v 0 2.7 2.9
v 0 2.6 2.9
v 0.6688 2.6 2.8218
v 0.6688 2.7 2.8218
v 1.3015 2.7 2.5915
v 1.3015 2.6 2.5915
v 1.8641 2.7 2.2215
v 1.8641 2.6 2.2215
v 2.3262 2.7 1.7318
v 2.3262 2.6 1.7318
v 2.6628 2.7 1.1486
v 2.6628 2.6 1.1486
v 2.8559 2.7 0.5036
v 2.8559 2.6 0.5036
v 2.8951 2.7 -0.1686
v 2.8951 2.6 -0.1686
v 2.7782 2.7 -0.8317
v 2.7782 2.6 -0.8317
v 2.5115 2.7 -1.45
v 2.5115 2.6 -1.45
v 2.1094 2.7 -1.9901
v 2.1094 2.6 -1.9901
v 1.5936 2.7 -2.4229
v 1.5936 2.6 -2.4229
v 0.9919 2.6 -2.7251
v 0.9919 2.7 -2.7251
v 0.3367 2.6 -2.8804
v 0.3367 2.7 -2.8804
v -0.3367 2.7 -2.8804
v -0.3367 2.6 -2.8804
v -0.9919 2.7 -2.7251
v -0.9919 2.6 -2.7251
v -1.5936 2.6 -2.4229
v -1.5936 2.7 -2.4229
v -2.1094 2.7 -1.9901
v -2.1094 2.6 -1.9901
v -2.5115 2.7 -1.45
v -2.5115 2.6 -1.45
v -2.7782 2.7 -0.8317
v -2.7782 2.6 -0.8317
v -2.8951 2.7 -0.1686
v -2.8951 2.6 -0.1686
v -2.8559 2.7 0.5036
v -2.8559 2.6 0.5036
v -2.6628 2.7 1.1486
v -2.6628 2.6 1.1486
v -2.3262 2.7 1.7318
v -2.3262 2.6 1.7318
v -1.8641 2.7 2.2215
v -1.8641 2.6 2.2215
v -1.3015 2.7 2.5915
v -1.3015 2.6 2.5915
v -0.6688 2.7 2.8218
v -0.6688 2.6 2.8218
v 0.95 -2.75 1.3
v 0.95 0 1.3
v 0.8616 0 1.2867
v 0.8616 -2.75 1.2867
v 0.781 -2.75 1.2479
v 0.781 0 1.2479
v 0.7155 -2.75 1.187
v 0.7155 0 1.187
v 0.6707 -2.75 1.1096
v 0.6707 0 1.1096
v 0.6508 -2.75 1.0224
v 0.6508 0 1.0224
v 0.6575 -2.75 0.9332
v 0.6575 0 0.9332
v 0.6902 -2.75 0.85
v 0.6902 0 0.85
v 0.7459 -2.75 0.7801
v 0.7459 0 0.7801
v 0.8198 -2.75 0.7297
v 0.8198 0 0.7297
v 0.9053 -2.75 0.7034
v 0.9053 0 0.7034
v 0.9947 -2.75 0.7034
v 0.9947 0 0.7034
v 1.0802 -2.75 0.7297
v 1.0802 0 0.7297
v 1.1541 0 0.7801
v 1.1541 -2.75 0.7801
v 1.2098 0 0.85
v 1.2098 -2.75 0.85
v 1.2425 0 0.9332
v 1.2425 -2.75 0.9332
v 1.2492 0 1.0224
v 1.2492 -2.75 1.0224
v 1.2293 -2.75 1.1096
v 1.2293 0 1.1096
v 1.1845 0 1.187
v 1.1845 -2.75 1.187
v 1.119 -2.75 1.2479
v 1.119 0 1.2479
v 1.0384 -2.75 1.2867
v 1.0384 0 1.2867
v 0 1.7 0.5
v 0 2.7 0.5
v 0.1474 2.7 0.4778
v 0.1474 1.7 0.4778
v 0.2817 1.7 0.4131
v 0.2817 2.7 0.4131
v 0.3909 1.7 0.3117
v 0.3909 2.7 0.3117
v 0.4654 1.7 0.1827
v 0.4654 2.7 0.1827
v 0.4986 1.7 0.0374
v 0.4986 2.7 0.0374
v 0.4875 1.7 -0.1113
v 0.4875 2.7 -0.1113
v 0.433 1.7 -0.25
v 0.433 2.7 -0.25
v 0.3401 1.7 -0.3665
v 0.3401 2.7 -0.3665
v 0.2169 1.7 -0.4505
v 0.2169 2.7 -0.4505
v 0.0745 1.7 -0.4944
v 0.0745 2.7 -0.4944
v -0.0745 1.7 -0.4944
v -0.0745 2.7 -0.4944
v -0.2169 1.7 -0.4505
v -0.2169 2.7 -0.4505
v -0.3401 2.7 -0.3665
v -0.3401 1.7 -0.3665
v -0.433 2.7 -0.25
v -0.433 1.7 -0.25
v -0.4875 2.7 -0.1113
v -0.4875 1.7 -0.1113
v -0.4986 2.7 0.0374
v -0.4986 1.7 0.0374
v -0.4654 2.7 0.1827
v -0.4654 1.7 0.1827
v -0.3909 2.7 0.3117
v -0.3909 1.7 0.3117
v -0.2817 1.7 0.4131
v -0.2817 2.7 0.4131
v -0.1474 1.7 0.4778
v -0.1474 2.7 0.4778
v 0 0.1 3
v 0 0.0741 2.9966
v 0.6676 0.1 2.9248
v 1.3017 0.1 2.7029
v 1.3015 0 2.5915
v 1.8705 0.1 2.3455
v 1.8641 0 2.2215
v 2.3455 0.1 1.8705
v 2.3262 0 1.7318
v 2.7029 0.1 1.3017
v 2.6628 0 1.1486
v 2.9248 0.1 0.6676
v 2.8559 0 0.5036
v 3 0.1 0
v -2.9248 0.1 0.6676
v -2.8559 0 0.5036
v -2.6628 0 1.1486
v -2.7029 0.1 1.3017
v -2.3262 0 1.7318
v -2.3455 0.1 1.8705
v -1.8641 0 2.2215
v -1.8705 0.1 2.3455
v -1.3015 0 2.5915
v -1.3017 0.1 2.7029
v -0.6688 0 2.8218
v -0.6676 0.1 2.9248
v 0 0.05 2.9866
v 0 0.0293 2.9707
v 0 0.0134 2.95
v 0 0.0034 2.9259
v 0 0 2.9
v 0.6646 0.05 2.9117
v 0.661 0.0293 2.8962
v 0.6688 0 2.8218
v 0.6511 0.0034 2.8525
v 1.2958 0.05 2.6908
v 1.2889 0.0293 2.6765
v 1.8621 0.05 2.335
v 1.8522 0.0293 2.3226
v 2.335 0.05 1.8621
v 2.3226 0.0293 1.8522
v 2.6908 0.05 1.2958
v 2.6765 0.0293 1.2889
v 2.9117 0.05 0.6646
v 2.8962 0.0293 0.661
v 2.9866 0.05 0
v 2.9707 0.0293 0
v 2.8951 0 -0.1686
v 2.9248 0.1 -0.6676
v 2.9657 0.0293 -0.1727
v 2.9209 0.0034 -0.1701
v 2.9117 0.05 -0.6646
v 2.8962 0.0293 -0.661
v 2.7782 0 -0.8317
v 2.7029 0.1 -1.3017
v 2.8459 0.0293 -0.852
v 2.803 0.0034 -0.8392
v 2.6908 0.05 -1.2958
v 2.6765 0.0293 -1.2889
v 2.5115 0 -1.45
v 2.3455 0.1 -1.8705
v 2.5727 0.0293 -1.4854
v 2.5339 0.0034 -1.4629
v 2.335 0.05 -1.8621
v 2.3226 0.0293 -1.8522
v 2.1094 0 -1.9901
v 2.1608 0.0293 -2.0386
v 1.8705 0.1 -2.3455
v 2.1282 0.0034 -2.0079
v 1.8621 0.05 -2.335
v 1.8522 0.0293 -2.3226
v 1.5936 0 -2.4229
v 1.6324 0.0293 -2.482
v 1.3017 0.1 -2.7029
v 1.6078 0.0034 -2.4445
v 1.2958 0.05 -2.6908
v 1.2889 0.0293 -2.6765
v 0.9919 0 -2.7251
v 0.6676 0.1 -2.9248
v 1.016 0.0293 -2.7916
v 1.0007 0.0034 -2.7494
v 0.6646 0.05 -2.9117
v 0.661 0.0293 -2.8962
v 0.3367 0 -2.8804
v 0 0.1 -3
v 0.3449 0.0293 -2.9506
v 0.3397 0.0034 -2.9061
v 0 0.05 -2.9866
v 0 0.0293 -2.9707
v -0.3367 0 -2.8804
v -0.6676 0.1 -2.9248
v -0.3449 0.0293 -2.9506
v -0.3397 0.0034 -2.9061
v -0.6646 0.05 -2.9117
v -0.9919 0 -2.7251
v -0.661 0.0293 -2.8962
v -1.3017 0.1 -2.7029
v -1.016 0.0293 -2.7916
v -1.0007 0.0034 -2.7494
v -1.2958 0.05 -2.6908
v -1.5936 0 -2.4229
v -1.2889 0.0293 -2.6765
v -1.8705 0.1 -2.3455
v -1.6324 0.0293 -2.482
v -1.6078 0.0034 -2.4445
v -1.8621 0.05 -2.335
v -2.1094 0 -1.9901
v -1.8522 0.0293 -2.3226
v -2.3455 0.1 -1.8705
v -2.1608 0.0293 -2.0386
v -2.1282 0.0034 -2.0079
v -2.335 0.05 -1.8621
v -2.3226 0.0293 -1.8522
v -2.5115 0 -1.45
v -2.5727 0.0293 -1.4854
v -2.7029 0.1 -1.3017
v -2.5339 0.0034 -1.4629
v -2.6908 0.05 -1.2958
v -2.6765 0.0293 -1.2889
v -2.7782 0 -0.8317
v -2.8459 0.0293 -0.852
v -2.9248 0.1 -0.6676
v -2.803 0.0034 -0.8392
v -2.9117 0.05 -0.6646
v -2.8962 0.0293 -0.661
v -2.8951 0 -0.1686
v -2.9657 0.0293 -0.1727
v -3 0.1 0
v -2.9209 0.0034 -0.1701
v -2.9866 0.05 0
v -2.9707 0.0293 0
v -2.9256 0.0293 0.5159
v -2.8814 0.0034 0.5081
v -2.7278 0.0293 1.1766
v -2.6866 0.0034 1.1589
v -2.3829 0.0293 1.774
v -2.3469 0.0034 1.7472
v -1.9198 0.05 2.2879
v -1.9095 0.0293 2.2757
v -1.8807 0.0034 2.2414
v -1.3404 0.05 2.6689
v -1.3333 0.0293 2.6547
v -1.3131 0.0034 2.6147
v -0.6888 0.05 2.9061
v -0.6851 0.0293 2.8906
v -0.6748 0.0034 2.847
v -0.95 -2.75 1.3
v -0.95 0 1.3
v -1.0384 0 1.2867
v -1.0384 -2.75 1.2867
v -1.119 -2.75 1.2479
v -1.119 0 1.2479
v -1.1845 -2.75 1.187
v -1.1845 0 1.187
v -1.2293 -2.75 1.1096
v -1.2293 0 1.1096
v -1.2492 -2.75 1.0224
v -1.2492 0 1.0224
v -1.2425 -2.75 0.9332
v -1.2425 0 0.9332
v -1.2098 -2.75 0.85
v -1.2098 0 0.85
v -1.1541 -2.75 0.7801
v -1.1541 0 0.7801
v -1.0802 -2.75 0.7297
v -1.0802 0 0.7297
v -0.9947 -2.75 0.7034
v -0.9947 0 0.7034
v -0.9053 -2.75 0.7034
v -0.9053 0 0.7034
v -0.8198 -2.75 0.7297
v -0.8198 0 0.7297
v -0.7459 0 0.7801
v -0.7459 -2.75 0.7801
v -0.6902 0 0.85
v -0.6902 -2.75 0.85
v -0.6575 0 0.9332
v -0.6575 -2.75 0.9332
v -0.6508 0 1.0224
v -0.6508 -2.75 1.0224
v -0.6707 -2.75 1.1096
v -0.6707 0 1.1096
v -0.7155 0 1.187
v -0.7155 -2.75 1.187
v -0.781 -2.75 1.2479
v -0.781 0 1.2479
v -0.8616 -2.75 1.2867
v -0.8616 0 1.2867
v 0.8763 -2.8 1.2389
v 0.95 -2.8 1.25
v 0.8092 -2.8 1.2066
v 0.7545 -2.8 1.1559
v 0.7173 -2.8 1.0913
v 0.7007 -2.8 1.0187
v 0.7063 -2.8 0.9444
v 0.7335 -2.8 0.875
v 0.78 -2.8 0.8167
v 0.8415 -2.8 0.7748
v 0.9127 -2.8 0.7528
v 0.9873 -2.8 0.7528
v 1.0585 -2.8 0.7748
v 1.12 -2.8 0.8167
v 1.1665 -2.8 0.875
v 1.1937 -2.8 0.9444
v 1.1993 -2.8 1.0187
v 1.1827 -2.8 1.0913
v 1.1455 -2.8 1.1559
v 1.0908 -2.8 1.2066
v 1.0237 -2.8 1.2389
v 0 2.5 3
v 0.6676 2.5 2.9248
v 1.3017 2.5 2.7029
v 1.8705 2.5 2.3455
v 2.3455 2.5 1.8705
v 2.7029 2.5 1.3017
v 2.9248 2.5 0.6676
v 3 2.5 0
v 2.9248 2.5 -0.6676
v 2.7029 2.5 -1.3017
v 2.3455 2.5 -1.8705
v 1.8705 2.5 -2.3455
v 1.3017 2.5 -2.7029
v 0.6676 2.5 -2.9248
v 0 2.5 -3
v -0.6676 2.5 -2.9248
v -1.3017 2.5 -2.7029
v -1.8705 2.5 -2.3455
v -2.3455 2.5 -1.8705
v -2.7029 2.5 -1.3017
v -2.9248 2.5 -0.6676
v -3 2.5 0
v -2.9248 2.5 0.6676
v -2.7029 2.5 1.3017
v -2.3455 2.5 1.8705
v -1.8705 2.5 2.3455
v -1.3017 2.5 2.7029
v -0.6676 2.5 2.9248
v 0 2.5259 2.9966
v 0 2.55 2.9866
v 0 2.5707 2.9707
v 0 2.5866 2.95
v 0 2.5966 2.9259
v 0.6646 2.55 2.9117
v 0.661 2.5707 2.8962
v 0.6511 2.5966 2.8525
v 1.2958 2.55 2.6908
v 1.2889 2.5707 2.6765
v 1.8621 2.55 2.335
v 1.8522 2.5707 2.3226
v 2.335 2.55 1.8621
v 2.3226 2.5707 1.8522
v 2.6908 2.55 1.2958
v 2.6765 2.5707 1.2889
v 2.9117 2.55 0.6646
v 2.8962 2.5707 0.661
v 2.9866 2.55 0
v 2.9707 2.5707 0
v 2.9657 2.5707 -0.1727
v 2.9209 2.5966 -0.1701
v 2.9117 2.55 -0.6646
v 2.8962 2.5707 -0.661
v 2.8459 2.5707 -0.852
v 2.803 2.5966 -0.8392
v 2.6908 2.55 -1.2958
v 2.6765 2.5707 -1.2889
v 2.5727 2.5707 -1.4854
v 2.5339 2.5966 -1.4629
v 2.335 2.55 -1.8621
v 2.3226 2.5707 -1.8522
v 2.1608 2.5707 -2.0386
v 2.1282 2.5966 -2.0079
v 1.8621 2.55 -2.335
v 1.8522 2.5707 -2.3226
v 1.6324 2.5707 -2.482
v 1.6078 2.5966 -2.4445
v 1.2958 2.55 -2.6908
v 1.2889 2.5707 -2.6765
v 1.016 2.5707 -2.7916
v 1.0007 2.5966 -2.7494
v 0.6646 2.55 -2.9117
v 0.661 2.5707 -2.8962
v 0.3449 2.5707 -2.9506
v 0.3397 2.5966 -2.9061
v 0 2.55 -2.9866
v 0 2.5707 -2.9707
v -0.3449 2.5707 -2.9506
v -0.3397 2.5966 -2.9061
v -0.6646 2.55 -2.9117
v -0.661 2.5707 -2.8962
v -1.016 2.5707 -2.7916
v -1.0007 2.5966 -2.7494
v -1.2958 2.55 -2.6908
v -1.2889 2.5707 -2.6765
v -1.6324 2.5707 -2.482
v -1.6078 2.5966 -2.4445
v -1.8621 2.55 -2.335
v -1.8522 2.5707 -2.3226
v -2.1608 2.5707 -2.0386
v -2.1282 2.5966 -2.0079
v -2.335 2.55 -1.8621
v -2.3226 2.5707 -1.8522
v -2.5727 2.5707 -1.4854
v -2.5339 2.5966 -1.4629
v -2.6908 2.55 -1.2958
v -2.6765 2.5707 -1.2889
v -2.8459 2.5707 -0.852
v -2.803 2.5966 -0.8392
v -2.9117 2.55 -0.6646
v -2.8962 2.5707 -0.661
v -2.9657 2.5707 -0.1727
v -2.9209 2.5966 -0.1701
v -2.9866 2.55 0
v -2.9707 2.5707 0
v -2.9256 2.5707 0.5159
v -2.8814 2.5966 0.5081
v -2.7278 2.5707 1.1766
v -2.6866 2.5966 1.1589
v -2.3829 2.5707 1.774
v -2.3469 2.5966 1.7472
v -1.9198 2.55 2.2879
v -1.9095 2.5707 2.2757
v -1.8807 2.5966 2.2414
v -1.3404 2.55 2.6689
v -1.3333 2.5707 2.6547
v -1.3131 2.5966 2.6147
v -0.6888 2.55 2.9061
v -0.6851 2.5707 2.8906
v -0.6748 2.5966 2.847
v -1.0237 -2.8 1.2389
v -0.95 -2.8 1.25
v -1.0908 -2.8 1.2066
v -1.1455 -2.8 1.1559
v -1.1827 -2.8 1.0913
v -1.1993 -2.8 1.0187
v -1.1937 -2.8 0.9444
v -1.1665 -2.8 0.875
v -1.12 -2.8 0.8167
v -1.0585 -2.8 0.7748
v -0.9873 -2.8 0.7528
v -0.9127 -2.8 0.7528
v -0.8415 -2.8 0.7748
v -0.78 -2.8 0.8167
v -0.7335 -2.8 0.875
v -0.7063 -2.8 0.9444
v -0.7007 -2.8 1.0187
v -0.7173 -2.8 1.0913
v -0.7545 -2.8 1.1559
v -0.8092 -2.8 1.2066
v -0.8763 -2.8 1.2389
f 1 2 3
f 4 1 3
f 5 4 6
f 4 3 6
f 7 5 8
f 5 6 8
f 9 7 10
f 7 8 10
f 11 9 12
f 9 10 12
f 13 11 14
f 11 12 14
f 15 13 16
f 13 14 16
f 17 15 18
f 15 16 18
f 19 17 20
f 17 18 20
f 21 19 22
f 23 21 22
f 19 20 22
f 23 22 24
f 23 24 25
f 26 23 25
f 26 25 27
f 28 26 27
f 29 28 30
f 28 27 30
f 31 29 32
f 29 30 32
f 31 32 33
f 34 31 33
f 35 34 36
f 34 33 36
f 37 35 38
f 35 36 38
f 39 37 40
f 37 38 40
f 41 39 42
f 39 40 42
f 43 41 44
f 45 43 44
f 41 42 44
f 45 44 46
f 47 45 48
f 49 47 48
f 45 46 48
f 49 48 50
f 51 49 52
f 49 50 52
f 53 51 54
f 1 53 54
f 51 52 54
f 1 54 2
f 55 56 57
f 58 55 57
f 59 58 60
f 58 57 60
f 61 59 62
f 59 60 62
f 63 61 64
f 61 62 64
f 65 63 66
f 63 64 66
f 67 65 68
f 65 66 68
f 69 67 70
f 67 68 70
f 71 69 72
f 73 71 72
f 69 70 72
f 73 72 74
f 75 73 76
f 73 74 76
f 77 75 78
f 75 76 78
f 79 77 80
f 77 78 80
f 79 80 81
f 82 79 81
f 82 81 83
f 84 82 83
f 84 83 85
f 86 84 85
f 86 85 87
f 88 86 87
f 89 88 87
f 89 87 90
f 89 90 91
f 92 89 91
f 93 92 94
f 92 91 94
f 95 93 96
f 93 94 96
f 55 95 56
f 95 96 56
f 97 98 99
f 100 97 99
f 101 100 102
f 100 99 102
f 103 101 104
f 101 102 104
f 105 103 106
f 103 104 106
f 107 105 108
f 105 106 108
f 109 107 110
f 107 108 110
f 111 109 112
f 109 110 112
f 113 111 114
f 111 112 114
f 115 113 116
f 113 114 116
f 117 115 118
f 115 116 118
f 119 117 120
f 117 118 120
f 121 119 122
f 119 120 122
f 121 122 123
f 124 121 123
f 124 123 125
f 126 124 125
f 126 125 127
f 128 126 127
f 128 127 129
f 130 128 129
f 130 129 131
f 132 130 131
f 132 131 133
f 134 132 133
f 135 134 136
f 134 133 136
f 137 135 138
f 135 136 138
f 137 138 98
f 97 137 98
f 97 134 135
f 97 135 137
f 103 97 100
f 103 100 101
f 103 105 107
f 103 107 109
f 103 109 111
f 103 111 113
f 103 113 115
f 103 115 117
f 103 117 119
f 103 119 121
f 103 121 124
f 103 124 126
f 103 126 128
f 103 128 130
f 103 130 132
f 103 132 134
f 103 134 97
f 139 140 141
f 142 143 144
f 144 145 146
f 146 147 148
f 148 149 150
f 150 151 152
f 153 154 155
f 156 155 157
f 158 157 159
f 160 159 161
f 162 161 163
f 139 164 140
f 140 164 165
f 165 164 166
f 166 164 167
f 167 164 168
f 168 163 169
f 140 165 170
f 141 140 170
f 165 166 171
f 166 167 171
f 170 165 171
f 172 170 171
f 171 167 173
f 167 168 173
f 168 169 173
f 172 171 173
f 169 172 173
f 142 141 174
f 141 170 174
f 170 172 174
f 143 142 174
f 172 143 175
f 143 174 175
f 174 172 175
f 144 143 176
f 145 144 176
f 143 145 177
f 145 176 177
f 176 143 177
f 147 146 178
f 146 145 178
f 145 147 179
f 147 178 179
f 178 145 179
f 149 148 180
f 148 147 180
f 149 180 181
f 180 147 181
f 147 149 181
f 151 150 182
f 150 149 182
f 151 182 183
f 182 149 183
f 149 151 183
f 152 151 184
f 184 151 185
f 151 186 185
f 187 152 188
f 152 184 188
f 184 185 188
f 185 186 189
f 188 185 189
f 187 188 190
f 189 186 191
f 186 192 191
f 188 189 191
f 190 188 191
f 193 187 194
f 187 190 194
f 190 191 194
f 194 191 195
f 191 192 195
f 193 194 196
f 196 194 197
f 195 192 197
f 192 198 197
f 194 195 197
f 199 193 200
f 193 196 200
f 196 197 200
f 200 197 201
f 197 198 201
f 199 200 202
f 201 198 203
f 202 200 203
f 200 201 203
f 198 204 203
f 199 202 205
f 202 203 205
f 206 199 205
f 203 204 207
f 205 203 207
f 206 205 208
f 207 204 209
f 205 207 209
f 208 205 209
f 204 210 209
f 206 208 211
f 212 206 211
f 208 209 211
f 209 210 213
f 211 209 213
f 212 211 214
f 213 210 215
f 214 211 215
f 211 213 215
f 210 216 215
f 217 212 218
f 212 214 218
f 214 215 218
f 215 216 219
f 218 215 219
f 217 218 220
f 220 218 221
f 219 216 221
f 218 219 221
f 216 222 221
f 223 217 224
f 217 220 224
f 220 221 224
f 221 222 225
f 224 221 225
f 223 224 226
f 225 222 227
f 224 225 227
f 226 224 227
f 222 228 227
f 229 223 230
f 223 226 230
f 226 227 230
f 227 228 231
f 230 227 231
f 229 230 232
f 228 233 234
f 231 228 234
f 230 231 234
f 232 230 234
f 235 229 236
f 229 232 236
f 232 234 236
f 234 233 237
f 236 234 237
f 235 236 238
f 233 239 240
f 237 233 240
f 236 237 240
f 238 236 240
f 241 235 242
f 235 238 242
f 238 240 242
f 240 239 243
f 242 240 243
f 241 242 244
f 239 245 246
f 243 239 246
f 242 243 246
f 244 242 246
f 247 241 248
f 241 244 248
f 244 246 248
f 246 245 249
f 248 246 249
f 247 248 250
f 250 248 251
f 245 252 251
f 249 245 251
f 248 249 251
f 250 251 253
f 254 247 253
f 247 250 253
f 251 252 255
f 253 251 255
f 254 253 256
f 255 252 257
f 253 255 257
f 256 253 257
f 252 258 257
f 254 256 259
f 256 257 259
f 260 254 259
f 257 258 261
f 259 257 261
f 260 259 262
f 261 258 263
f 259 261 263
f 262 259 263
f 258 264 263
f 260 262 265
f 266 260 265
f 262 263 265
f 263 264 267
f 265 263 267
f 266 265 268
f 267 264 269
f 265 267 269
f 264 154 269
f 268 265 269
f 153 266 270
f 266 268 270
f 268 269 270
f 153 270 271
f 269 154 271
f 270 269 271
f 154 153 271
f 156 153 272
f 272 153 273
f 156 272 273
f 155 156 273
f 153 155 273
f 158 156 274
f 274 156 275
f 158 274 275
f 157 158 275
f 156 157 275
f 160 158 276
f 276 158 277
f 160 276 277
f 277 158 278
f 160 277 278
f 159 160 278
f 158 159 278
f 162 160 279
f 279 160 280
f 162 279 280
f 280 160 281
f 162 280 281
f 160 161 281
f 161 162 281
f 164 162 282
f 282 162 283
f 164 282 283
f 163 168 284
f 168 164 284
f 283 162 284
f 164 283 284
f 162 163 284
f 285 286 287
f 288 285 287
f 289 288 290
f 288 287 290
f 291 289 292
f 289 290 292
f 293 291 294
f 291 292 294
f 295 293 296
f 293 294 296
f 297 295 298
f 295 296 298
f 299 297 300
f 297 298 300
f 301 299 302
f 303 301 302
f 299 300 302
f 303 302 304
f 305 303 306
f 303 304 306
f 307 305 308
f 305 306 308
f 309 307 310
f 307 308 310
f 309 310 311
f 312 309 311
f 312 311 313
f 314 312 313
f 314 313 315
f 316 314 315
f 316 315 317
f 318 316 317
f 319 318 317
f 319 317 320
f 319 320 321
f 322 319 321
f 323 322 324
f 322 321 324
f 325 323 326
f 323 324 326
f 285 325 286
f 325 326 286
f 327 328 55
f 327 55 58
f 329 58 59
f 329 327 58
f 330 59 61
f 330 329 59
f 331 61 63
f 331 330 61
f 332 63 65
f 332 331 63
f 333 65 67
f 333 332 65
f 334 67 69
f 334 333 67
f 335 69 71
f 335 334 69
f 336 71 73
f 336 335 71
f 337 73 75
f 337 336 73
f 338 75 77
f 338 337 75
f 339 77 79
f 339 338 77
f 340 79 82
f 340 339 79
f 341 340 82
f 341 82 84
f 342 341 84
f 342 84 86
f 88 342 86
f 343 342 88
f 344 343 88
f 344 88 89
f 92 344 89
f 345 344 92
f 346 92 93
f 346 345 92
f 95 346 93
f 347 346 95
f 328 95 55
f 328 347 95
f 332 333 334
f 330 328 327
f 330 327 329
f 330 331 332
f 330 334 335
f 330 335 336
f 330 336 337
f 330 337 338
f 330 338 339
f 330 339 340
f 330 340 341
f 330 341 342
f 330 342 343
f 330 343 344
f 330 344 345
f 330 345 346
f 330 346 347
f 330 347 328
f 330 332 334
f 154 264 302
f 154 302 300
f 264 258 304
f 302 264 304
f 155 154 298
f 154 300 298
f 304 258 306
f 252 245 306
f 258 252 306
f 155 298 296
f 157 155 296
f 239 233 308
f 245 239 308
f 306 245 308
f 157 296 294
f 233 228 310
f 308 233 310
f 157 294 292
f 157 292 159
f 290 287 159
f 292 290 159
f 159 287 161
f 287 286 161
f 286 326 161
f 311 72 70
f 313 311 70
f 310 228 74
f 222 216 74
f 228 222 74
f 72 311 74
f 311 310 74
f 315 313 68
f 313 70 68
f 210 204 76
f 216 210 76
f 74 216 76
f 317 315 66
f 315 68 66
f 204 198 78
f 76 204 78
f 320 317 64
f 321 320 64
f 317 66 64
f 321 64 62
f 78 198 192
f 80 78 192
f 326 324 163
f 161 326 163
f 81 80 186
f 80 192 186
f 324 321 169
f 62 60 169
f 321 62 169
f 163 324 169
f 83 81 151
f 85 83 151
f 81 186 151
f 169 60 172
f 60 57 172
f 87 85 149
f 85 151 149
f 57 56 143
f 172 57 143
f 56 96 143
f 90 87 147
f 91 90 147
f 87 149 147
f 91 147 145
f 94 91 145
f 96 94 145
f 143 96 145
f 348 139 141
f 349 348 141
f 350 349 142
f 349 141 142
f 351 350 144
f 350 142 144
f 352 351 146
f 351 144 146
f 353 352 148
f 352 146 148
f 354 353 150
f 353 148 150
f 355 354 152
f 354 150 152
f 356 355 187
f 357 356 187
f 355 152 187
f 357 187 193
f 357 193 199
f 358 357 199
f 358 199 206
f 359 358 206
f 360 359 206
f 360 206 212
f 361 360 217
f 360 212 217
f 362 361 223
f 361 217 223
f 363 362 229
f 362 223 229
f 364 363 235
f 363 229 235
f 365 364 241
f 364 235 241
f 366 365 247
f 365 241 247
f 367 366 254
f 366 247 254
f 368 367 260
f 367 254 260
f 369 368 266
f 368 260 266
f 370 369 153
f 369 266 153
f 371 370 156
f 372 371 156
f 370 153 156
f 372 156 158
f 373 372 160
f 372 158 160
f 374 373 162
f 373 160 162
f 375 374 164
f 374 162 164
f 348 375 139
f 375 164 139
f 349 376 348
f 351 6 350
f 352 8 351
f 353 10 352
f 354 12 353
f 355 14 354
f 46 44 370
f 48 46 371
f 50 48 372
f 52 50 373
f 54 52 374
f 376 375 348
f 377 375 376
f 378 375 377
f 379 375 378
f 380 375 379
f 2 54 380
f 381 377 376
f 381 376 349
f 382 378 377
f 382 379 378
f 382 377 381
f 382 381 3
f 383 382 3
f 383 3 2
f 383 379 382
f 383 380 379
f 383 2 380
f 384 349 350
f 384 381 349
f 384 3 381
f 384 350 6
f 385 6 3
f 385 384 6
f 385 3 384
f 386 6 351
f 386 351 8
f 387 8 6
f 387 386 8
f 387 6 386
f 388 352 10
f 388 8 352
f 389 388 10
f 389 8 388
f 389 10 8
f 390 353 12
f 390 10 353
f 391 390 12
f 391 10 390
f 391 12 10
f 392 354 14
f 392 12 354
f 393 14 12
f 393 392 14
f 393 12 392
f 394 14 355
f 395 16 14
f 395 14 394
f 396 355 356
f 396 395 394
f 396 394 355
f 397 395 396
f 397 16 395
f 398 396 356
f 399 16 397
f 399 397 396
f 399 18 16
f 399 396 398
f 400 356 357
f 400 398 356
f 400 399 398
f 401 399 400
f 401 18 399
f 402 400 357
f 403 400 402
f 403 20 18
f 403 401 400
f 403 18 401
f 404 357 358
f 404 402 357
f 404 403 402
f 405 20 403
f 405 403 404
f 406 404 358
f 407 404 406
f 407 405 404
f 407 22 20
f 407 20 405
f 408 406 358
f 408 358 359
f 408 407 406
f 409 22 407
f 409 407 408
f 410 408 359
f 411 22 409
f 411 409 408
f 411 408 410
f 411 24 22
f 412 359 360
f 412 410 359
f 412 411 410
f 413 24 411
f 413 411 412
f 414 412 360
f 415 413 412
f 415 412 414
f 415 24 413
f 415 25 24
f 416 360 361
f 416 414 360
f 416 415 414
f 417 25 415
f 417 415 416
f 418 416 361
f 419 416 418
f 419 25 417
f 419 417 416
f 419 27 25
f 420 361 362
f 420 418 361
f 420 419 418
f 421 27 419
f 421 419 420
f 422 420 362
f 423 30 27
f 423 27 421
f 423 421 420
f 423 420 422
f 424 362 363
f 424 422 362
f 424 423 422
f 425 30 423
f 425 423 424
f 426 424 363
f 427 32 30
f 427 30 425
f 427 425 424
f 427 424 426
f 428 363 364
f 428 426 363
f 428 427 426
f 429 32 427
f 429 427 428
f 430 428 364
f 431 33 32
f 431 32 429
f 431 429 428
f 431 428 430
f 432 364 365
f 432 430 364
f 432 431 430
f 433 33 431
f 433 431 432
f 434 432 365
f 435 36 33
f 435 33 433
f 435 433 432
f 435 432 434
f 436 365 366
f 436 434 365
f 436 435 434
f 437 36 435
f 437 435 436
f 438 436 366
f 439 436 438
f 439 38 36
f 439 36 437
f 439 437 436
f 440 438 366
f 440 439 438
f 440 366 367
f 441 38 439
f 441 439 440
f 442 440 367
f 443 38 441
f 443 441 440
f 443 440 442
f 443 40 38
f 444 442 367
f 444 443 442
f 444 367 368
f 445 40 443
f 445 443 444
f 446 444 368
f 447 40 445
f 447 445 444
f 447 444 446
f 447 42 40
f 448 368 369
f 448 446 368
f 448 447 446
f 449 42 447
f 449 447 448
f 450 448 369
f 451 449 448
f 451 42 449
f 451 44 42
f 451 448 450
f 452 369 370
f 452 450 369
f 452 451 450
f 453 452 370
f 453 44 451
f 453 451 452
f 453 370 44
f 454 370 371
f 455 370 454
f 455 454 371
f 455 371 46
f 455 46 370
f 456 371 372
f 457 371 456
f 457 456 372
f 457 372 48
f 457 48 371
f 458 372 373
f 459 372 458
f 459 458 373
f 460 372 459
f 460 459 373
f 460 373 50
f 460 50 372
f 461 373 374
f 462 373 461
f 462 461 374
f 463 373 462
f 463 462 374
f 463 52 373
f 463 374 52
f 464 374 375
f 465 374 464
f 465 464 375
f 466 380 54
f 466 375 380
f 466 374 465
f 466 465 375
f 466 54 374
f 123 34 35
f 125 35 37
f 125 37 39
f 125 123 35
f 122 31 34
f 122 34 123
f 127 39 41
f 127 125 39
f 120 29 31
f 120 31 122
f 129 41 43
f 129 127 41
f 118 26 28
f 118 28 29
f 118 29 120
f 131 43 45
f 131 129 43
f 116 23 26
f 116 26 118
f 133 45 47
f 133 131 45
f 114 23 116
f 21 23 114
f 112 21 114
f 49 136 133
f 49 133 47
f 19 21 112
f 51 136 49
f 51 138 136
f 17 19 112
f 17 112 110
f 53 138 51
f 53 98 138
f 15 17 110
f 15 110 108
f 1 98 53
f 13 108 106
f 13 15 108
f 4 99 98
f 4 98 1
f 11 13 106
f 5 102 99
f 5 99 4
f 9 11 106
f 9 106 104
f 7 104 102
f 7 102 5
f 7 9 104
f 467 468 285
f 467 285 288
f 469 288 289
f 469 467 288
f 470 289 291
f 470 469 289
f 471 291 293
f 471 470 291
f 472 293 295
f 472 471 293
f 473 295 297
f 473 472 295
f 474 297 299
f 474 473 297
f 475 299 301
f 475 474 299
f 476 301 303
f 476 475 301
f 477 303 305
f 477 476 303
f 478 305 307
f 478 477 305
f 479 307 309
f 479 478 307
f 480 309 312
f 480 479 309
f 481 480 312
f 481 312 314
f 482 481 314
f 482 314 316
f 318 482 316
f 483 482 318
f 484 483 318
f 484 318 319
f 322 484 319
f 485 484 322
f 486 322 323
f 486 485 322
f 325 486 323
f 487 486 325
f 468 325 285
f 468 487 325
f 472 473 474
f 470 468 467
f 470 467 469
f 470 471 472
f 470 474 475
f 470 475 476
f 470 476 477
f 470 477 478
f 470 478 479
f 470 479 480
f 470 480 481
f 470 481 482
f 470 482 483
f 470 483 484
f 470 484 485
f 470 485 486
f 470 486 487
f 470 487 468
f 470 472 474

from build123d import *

# Parameters (mm, degrees)
SKETCH1_R           = 3
BOSS_EXTRUDE1_DEPTH = 2.6
FILLET1_R           = 0.1
SKETCH3_R           = 2.9
BOSS_EXTRUDE2_DEPTH = 0.1
SKETCH2_R           = 0.5
CUT_EXTRUDE1_DEPTH  = 1
SKETCH4_R           = 0.3
BOSS_EXTRUDE3_DEPTH = 2.8
CHAMFER1_SIZE       = 0.05


with BuildPart() as part:
    # Sketch1 → Boss-Extrude1 (new body)
    with BuildSketch(Plane(origin=(0, 0, 0), x_dir=(1, 0, 0), z_dir=(0, 1, 0))):
        with Locations(Location((0, 0, 0), (0, 0, 270))):
            Circle(SKETCH1_R)
    extrude(amount=BOSS_EXTRUDE1_DEPTH)

    # Fillet1
    fillet1_edges = [part.edges().sort_by_distance(p)[0] for p in [
        (0, 0, -3),
        (0, 2.6, -3),
    ]]
    fillet(fillet1_edges, radius=FILLET1_R)

    # Sketch3 → Boss-Extrude2 (add)
    with BuildSketch(Plane(origin=(0, 2.6, 0), x_dir=(1, 0, 0), z_dir=(0, 1, 0))):
        with Locations(Location((0, 0, 0), (0, 0, 270))):
            Circle(SKETCH3_R)
    extrude(amount=BOSS_EXTRUDE2_DEPTH)

    # Sketch2 → Cut-Extrude1 (cut)
    with BuildSketch(Plane(origin=(0, 2.7, 0), x_dir=(1, 0, 0), z_dir=(0, 1, 0))):
        with Locations(Location((0, 0, 0), (0, 0, 270))):
            Circle(SKETCH2_R)
    extrude(amount=-CUT_EXTRUDE1_DEPTH, mode=Mode.SUBTRACT)

    # Sketch4 → Boss-Extrude3 (add)
    with BuildSketch(Plane.XZ):
        with Locations(Location((-0.95, 1, 0), (0, 0, 90))):
            Circle(SKETCH4_R)
        with Locations(Location((0.95, 1, 0), (0, 0, 90))):
            Circle(SKETCH4_R)
    extrude(amount=BOSS_EXTRUDE3_DEPTH)

    # Chamfer1
    chamfer1_edges = [part.edges().sort_by_distance(p)[0] for p in [
        (-0.95, -2.8, 0.7),
        (0.95, -2.8, 0.7),
    ]]
    chamfer(chamfer1_edges, length=CHAMFER1_SIZE)


solid = part.part
